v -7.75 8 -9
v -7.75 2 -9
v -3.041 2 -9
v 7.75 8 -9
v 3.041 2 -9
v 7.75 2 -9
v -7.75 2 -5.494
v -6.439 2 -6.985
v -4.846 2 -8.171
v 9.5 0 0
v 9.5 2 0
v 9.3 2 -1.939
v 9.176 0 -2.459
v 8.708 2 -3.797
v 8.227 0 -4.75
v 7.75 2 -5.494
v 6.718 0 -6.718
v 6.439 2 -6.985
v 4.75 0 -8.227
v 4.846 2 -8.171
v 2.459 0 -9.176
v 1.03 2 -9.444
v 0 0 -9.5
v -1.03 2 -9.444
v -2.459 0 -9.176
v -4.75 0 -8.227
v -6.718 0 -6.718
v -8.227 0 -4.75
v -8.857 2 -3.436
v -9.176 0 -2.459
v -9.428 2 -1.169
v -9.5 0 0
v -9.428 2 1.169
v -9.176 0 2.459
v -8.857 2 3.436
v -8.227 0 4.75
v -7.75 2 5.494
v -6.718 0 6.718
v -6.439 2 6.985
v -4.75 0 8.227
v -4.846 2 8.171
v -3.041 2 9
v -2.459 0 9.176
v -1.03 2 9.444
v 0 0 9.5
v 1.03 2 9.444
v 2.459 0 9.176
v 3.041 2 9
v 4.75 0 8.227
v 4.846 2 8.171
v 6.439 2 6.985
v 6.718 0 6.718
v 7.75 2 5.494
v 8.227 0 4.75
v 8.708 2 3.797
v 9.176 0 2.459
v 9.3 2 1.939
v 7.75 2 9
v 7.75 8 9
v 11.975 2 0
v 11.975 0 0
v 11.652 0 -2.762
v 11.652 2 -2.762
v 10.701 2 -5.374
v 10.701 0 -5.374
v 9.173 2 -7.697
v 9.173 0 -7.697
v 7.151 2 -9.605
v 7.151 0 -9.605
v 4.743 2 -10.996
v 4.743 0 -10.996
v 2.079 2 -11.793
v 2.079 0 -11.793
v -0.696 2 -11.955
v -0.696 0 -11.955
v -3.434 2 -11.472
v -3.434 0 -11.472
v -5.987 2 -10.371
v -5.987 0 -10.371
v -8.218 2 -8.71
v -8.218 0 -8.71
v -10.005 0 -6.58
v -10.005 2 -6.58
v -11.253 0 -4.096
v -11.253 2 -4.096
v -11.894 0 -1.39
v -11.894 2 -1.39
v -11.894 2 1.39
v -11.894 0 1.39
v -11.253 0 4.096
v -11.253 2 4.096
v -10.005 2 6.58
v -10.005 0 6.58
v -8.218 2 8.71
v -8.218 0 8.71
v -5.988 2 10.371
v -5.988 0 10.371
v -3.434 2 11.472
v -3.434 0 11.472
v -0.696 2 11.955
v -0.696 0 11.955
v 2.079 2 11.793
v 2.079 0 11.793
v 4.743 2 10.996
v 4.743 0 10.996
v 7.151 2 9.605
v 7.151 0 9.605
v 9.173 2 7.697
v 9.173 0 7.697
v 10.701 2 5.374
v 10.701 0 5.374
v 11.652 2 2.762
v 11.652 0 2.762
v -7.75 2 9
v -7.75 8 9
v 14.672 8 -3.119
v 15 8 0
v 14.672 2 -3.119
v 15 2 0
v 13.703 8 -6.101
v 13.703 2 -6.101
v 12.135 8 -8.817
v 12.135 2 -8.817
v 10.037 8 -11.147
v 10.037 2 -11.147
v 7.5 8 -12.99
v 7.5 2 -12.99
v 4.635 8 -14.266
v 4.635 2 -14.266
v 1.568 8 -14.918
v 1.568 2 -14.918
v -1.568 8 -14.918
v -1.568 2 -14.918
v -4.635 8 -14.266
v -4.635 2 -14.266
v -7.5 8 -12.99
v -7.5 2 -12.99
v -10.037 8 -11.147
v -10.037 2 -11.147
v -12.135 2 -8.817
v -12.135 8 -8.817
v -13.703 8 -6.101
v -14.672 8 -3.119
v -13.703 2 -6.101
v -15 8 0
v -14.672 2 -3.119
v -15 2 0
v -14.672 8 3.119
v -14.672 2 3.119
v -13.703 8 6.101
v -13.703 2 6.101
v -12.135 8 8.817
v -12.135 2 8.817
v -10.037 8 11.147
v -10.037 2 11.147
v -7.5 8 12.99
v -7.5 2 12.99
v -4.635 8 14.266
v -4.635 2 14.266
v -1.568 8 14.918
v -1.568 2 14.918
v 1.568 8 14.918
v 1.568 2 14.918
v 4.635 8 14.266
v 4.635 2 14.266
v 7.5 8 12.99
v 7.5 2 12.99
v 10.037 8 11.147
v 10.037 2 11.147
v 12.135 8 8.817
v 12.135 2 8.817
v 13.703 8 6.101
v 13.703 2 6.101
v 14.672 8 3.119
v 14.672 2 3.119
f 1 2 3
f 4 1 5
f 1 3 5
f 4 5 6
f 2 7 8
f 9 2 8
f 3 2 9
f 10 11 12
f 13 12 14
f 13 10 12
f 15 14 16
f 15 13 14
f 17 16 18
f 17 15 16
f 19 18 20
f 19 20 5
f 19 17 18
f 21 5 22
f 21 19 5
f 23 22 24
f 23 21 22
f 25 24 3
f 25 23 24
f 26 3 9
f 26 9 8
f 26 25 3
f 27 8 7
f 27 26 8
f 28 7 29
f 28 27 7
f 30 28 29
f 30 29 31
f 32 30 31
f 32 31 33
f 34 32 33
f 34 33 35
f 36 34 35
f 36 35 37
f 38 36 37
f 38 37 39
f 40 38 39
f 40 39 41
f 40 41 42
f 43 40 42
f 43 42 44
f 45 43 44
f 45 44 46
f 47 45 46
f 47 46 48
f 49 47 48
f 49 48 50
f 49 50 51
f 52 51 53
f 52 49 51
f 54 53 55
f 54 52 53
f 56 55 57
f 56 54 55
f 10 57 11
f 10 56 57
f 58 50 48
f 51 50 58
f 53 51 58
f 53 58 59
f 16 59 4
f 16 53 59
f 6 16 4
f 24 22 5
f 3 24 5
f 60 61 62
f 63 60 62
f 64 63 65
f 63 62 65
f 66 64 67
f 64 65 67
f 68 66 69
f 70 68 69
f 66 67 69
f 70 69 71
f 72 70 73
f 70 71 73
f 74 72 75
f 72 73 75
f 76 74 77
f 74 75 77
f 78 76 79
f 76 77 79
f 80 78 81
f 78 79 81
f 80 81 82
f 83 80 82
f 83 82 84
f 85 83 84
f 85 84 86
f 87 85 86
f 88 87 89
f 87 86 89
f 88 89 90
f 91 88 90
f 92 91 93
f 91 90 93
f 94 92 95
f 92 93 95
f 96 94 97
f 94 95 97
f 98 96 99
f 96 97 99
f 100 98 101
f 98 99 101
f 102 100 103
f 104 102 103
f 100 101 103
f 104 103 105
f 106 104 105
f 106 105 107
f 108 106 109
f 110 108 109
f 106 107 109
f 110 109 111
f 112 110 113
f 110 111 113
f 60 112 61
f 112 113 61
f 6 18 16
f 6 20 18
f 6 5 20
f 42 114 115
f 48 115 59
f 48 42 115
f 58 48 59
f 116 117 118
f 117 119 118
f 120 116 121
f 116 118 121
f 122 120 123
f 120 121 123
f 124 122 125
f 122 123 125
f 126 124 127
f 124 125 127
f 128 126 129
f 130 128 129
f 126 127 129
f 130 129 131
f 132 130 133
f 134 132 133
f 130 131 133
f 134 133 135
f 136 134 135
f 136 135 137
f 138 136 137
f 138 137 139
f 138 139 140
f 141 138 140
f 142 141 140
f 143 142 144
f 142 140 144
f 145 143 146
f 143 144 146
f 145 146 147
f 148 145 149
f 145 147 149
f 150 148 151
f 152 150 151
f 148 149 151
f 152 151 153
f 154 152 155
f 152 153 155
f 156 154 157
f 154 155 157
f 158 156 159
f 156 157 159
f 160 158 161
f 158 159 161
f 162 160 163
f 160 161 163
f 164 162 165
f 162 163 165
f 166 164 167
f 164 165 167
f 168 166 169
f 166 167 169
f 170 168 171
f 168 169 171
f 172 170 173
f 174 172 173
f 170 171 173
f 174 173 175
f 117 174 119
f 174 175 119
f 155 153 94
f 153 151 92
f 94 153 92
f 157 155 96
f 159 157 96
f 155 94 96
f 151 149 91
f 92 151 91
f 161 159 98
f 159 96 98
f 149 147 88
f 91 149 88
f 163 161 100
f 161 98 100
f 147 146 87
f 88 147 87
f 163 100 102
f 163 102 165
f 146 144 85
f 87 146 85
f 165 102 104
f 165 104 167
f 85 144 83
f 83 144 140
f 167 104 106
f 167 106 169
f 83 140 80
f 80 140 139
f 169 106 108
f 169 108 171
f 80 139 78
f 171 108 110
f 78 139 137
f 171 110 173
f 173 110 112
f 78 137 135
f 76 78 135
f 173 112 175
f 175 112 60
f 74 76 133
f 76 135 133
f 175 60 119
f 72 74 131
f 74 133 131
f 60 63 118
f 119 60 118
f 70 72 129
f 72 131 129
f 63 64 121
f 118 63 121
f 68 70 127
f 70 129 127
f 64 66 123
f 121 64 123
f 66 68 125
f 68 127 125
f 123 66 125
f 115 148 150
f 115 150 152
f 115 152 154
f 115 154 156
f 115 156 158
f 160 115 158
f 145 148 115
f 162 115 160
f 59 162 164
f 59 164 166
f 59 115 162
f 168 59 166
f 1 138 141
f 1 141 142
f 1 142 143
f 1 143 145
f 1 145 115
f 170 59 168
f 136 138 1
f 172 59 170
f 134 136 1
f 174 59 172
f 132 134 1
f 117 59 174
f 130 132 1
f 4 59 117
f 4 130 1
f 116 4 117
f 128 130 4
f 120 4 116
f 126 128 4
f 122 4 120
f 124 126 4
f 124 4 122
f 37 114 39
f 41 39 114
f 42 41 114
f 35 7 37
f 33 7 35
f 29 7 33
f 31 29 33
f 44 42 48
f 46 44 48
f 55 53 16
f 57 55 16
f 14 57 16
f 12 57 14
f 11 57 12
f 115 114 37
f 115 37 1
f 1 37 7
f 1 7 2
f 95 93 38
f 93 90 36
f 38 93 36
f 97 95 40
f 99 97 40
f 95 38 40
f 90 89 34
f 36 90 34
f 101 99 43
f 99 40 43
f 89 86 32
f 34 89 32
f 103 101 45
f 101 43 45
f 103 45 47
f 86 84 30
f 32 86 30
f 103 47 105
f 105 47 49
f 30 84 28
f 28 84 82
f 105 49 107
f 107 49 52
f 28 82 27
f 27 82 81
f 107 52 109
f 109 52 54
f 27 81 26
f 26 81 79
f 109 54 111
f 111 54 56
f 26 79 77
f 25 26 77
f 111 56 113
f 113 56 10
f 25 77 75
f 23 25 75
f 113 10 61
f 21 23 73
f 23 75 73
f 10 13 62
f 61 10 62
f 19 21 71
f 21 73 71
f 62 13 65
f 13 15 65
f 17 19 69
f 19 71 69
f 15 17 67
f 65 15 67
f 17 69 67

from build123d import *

# Parameters (mm, degrees)
ESQUISSE1_R        = 11.975
ESQUISSE1_R_2      = 9.5
BOSS_EXTRU_1_DEPTH = 2
ESQUISSE3_R        = 15
ESQUISSE3_W        = 15.5
ESQUISSE3_H        = 18
BOSS_EXTRU_5_DEPTH = 2
ESQUISSE8_R        = 15
ESQUISSE8_W        = 15.5
ESQUISSE8_H        = 18
BOSS_EXTRU_6_DEPTH = 4


with BuildPart() as part:
    # Esquisse1 → Boss.-Extru.1 (new body)
    with BuildSketch(Plane(origin=(0, 0, 0), x_dir=(1, 0, 0), z_dir=(0, 1, 0))):
        Circle(ESQUISSE1_R)
        Circle(ESQUISSE1_R_2, mode=Mode.SUBTRACT)
    extrude(amount=BOSS_EXTRU_1_DEPTH)

    # Esquisse3 → Boss.-Extru.5 (add)
    with BuildSketch(Plane(origin=(0, 2, 0), x_dir=(1, 0, 0), z_dir=(0, 1, 0))):
        Circle(ESQUISSE3_R)
        Rectangle(ESQUISSE3_W, ESQUISSE3_H, mode=Mode.SUBTRACT)
    extrude(amount=BOSS_EXTRU_5_DEPTH)

    # Esquisse8 → Boss.-Extru.6 (add)
    with BuildSketch(Plane(origin=(0, 4, 0), x_dir=(1, 0, 0), z_dir=(0, 1, 0))):
        Circle(ESQUISSE8_R)
        Rectangle(ESQUISSE8_W, ESQUISSE8_H, mode=Mode.SUBTRACT)
    extrude(amount=BOSS_EXTRU_6_DEPTH)


solid = part.part
